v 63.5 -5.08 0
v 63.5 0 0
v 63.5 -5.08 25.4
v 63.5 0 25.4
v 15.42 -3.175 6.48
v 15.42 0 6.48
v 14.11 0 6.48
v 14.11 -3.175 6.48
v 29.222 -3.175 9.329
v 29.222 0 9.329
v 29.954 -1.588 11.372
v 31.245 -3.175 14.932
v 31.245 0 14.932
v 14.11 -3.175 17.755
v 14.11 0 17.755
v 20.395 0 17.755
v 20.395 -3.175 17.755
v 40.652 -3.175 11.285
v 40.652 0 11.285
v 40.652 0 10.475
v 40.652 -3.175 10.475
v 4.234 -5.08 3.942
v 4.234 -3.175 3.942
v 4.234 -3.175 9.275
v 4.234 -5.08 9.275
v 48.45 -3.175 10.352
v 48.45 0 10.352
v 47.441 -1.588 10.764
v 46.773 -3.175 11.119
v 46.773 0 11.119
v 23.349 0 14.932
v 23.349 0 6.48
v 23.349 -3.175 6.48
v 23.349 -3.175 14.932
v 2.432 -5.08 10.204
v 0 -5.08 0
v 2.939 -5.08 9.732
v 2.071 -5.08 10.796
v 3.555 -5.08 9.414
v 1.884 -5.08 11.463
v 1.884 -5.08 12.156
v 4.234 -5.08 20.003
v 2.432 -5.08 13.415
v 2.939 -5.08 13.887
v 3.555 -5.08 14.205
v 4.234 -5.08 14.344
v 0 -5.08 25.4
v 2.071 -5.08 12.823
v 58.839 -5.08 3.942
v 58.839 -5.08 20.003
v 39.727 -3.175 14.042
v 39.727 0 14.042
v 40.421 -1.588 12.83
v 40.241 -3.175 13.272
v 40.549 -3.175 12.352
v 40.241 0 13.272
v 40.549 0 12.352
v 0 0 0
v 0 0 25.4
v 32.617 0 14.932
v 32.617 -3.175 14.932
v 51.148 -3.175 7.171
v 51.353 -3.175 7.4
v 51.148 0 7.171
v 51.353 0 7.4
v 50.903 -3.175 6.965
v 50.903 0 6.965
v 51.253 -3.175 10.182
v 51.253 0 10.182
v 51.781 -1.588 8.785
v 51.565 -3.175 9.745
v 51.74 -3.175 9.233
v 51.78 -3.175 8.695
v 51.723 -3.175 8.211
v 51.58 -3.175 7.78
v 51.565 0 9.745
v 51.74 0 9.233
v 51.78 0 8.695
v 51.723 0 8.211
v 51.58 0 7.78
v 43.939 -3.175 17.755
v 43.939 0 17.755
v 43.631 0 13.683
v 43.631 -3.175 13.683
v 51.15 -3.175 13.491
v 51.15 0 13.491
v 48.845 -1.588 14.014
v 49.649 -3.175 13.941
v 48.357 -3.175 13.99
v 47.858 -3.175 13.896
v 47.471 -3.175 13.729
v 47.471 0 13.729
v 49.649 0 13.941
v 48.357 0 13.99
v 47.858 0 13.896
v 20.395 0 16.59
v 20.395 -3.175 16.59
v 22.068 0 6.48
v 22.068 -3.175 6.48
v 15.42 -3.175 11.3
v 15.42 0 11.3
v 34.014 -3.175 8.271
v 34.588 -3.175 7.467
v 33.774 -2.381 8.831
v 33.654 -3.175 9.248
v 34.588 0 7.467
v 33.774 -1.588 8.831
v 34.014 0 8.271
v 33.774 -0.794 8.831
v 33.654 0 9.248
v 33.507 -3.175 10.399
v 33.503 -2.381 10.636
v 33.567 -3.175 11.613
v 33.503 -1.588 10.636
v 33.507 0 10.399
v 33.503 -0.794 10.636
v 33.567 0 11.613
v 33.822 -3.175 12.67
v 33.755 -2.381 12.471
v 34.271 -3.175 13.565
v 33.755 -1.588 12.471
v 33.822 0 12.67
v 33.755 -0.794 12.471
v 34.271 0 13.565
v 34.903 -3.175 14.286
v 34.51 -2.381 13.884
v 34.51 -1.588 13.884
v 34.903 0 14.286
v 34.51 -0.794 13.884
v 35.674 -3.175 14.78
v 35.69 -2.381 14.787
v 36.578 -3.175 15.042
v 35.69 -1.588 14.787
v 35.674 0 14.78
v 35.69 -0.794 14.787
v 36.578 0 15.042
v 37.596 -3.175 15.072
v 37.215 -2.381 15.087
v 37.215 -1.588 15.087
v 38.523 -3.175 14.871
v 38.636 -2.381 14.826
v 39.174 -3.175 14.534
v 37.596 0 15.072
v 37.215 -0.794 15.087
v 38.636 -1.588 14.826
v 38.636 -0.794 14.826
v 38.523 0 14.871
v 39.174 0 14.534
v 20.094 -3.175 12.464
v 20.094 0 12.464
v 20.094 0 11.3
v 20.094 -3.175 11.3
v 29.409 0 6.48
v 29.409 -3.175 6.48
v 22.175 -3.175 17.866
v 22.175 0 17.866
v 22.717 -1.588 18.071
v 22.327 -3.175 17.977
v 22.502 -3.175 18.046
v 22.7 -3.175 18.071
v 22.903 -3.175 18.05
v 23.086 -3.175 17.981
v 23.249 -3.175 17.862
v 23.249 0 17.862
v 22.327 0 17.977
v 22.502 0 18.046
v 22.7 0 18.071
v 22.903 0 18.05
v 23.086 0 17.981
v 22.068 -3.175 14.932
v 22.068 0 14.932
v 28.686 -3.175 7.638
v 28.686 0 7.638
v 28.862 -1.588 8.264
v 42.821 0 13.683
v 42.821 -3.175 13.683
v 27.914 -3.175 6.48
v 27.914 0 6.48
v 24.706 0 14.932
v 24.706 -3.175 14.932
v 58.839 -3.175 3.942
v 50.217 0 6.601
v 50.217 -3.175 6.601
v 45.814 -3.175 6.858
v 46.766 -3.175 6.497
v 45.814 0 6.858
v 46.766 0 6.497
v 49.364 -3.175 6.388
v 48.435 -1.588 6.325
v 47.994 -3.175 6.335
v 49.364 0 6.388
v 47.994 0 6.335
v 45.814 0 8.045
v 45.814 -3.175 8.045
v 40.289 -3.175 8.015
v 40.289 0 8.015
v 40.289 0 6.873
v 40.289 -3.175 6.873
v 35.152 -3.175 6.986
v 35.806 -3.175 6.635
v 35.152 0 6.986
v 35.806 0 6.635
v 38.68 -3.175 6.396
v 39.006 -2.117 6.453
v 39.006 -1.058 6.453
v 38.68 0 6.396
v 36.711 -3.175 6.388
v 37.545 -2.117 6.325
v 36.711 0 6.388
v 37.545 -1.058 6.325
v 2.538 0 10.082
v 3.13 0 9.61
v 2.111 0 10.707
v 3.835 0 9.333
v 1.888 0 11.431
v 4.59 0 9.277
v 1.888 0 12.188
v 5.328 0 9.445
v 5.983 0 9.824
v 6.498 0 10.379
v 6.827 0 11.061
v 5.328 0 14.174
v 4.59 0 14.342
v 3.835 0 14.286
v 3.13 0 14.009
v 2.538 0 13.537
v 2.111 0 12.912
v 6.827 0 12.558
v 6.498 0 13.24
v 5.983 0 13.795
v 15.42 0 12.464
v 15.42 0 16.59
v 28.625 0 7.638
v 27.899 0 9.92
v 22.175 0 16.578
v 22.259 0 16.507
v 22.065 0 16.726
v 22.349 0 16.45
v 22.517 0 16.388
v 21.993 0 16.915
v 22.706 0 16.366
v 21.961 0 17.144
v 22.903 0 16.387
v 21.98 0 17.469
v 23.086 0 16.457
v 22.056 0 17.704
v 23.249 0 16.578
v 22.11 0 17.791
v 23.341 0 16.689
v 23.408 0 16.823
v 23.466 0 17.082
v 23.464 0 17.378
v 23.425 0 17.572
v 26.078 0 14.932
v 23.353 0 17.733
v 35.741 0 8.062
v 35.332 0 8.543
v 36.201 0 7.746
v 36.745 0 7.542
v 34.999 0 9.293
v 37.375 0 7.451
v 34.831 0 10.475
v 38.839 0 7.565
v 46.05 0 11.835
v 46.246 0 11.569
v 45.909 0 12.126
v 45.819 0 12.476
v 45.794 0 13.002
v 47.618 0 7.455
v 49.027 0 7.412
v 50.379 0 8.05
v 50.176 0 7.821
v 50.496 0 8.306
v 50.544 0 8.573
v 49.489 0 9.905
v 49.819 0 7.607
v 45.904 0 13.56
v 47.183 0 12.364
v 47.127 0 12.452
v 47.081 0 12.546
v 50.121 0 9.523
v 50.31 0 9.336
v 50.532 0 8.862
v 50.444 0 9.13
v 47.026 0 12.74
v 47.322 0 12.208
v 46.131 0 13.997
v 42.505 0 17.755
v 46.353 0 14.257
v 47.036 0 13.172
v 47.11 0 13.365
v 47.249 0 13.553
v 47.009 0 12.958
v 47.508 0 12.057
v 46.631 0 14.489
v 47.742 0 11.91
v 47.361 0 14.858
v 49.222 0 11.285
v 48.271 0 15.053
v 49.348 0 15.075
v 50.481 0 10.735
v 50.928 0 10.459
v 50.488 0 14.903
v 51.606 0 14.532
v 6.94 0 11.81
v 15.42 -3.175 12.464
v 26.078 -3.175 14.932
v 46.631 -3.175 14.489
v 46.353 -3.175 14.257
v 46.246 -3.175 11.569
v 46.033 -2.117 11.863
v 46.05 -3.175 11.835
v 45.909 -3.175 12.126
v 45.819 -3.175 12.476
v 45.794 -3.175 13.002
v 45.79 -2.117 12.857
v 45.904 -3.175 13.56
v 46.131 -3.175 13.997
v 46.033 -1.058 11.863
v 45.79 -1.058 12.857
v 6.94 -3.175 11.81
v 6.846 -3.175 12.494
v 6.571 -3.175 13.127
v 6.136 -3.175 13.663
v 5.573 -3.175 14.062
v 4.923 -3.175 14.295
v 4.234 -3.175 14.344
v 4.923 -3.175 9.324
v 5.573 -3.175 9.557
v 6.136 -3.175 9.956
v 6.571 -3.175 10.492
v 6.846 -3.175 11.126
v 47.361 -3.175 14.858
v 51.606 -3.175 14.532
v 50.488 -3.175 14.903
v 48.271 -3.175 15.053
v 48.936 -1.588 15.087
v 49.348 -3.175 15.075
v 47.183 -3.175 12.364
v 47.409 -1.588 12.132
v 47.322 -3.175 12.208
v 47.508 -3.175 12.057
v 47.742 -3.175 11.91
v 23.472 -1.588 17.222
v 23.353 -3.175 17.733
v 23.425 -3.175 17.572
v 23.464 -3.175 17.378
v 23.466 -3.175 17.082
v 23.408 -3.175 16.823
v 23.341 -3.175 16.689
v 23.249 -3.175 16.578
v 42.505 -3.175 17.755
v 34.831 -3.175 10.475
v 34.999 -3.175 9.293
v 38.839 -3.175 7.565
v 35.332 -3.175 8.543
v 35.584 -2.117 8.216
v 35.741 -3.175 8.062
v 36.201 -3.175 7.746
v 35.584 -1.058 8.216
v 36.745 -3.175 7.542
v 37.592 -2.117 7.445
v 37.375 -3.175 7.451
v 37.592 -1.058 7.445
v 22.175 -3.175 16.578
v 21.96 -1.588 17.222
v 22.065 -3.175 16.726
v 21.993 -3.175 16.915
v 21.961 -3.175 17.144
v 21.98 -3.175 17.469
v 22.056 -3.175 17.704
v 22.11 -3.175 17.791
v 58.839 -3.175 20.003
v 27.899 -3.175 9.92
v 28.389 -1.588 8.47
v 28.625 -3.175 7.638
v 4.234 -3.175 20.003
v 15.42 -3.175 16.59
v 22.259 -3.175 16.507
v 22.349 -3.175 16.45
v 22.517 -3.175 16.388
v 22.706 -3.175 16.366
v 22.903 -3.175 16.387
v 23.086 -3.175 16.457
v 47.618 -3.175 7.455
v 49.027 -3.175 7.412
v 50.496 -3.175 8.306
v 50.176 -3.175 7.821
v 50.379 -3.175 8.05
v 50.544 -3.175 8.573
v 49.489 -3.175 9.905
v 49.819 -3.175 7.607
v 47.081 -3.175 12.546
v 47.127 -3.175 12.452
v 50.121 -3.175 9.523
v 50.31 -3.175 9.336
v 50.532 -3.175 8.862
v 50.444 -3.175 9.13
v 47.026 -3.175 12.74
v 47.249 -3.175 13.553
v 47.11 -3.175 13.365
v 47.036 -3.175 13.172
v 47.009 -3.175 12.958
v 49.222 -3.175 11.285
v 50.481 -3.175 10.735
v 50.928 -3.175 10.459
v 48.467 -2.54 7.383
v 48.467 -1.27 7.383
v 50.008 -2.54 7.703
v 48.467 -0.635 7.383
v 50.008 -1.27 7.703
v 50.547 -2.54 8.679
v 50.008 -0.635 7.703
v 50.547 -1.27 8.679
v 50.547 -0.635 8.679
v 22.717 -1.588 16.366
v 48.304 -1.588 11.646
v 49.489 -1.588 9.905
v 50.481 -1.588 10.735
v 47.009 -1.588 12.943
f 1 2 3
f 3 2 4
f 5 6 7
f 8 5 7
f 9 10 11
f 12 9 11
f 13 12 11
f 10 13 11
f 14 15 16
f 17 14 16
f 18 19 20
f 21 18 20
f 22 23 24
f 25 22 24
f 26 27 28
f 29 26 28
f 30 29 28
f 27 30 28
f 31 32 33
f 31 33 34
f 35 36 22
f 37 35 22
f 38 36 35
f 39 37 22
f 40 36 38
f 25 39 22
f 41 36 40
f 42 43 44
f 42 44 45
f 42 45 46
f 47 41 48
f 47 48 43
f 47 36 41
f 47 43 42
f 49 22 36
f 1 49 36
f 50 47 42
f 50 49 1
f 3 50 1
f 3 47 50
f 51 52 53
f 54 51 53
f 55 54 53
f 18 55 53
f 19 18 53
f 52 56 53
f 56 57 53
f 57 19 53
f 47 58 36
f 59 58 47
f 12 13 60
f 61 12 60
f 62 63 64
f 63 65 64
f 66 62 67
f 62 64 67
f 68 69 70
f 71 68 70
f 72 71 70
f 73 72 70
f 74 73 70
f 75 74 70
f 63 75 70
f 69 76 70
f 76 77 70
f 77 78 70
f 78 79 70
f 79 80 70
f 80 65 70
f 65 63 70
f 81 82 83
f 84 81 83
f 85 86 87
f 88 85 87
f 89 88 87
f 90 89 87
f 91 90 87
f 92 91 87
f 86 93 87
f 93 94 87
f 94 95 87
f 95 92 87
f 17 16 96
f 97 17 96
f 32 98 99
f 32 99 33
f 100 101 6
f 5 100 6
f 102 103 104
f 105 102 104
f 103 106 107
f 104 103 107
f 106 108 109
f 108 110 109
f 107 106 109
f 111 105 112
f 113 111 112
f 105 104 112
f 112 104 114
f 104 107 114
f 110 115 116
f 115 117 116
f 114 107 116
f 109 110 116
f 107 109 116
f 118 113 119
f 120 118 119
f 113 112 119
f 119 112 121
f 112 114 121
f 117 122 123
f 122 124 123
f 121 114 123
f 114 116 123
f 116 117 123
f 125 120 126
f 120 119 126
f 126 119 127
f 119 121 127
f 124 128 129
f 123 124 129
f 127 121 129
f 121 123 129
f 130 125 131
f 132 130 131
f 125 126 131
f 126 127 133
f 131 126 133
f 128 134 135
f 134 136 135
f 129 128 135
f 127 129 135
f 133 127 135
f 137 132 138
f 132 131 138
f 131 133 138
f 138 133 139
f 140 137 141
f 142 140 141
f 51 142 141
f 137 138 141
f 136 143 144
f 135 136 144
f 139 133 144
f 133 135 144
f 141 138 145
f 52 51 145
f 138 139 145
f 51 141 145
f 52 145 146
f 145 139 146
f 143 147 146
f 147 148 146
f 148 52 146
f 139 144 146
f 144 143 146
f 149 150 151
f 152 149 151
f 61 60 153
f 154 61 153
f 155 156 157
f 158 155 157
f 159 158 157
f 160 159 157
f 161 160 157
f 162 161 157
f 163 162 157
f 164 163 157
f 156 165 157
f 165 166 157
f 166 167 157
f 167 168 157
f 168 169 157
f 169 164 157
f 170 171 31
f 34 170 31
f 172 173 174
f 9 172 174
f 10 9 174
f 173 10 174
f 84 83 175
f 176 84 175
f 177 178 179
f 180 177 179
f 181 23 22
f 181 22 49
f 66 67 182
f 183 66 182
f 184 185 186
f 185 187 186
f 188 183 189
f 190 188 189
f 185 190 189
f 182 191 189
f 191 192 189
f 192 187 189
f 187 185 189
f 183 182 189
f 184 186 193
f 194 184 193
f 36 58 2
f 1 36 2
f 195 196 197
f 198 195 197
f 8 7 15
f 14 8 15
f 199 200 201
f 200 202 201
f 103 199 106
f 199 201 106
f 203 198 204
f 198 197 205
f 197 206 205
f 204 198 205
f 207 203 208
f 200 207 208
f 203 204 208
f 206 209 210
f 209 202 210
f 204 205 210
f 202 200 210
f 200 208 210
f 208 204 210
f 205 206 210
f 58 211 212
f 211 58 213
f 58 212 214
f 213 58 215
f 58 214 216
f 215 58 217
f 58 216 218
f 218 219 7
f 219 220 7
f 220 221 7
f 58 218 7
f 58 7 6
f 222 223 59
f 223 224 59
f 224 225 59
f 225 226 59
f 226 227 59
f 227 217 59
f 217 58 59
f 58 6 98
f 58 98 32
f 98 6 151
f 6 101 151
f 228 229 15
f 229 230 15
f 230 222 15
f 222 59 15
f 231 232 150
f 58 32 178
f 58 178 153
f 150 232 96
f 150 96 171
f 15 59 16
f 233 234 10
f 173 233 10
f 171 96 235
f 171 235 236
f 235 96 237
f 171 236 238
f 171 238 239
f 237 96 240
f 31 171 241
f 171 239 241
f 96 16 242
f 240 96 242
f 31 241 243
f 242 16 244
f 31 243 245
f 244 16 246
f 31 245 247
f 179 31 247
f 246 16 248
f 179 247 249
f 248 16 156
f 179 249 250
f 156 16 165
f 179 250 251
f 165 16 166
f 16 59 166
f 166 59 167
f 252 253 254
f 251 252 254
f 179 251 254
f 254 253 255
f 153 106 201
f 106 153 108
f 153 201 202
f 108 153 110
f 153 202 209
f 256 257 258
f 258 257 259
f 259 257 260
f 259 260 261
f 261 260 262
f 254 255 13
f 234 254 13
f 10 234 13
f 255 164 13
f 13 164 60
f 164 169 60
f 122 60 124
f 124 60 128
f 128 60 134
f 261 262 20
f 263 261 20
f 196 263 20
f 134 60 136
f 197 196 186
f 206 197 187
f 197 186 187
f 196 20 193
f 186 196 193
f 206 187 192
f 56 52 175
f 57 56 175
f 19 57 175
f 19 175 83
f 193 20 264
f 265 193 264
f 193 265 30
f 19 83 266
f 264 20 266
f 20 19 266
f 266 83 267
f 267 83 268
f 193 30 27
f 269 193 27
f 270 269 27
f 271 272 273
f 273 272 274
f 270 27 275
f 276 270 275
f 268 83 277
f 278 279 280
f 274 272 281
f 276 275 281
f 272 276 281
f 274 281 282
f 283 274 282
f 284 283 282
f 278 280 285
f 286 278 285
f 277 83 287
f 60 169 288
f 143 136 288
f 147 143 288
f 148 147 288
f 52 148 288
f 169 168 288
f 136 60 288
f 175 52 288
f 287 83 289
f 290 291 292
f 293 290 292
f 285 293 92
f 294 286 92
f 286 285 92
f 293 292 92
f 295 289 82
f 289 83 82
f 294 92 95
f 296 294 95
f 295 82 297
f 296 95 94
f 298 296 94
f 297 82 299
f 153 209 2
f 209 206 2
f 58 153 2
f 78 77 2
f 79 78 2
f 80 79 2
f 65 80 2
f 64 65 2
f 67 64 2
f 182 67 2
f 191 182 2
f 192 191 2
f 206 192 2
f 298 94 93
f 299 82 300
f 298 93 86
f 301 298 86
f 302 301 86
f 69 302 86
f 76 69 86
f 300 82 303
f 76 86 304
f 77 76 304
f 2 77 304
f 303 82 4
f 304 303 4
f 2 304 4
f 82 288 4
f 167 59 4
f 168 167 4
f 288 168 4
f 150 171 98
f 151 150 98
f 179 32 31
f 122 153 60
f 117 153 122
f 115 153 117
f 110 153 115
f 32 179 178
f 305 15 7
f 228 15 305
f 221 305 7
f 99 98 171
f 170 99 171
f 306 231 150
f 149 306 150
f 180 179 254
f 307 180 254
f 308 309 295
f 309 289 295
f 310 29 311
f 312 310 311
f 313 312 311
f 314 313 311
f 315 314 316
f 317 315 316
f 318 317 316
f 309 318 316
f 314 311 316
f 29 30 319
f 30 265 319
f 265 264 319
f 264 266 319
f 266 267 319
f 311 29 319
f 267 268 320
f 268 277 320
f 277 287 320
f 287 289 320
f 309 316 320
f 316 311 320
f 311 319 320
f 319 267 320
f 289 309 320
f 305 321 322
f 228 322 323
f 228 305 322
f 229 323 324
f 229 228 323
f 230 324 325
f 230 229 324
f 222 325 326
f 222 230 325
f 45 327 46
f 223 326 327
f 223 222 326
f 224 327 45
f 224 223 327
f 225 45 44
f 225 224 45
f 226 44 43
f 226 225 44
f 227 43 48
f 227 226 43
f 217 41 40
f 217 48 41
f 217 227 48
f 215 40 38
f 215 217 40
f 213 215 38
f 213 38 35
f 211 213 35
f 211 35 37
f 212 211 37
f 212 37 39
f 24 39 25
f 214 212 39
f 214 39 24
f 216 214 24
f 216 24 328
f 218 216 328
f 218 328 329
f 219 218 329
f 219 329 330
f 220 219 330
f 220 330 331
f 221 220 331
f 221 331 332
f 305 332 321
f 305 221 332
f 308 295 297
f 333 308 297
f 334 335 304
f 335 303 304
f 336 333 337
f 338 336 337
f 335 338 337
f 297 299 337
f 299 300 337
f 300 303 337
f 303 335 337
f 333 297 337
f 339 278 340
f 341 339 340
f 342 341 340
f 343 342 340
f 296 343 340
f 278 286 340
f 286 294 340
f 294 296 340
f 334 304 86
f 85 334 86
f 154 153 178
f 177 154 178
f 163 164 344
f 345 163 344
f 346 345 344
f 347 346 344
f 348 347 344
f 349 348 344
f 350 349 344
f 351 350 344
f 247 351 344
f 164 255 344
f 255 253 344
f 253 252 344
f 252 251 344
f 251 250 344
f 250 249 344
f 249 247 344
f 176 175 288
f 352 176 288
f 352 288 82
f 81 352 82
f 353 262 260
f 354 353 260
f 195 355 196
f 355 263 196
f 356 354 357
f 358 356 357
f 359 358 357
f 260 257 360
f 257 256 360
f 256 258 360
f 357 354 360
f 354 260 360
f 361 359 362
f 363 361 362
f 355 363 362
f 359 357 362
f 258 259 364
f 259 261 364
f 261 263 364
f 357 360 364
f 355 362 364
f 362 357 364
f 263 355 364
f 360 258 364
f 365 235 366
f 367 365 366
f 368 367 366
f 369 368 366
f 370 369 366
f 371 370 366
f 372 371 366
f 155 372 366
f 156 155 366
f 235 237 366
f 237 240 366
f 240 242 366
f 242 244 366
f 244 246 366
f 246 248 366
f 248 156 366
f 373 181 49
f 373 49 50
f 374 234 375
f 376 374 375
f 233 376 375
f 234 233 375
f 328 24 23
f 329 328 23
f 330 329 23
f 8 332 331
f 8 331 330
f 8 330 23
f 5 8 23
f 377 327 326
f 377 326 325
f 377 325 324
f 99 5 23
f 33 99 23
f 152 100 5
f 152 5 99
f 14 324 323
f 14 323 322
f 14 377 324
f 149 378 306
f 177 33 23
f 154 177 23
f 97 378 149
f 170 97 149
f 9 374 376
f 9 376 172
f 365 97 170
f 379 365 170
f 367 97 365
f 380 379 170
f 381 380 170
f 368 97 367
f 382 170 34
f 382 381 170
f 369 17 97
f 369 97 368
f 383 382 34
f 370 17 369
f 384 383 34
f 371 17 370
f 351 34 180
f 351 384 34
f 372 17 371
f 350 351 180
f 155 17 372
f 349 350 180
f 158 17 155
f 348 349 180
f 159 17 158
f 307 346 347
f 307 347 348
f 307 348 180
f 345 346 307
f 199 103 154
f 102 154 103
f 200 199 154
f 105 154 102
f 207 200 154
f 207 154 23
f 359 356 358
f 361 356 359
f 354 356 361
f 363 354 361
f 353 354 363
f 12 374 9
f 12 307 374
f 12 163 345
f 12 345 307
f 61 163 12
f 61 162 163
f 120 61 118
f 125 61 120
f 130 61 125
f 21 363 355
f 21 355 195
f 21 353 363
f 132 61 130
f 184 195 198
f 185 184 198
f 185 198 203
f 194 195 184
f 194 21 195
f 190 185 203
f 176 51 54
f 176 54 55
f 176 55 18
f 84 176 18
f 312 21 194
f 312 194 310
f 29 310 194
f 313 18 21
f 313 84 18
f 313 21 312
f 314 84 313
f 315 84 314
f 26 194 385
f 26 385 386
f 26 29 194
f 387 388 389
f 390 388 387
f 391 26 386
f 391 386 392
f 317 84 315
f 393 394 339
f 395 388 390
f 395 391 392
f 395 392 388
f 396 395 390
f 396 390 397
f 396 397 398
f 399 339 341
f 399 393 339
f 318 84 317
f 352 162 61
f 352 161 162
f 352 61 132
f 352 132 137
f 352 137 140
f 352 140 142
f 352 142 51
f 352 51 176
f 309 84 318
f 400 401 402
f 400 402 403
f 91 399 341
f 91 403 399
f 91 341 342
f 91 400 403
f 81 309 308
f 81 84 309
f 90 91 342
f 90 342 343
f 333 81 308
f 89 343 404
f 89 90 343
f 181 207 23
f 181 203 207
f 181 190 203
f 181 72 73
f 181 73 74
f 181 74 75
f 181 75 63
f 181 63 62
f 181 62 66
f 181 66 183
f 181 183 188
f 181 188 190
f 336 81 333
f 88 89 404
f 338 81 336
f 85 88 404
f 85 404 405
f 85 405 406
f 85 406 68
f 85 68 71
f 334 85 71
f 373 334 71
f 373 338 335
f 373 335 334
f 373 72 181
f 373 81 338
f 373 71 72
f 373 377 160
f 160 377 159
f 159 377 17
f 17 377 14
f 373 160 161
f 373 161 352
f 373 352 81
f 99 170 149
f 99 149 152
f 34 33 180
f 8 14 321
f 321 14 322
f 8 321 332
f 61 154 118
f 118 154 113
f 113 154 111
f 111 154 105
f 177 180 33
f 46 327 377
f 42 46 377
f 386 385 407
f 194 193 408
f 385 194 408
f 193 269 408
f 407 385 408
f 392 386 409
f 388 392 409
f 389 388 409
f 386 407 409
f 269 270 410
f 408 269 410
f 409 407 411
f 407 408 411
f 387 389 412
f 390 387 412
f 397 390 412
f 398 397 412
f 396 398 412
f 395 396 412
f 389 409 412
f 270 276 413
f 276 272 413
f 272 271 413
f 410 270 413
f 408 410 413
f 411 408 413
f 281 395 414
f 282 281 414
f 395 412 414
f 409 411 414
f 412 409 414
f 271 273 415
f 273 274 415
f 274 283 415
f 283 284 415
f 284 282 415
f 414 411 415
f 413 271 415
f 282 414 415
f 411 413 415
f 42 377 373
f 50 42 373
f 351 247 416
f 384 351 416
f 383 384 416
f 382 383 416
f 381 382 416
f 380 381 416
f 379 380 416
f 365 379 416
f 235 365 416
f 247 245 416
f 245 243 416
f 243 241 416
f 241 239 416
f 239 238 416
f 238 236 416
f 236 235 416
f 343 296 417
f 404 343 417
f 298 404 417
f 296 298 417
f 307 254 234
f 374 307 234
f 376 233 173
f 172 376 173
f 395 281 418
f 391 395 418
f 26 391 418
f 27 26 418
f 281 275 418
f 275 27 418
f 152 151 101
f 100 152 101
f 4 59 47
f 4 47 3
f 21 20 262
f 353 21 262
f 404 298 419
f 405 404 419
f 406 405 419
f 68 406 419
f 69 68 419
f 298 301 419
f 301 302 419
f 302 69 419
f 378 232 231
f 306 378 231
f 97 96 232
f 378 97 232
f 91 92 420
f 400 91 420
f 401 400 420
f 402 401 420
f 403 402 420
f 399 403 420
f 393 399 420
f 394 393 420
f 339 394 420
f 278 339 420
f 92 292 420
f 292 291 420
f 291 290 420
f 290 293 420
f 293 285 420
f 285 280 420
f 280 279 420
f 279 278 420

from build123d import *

# Parameters (mm, degrees)
F0_W     = 63.5
F0_H     = 25.4
F0_W_2   = 54.6053671278
F0_H_2   = 16.0604021512
F1_DEPTH = 5.08
F0_W_3   = 1.2807164436
F0_H_3   = 8.4517414633
F2_DEPTH = 3.175
F3_R     = 2.54
F4_DEPTH = 25.4
F5_DEPTH = 3.175


with BuildPart() as f1:
    # F0 (on Front) → F1 (new body)
    with BuildSketch(Plane.XZ):
        with Locations((31.75, 12.7)):
            Rectangle(F0_W, F0_H)
        with Locations((31.5367903095, 11.9723000098)):
            Rectangle(F0_W_2, F0_H_2, mode=Mode.SUBTRACT)
    extrude(amount=F1_DEPTH)

    # F0 (on Front) → F2 (join)
    with BuildSketch(Plane.XZ):
        with Locations((31.5367903095, 11.9723000098)):
            Rectangle(F0_W_2, F0_H_2)
        with Locations((22.7084914528, 10.7061468506)):
            Rectangle(F0_W_3, F0_H_3, mode=Mode.SUBTRACT)
        Polygon((15.4202525004, 11.2996194994), (15.4202525004, 6.480276119), (14.1099241159, 6.480276119), (14.1099241159, 17.7550226141), (20.3950585705, 17.7550226141), (20.3950585705, 16.5902862723), (15.4202525004, 16.5902862723), (15.4202525004, 12.4643558412), (20.0940038381, 12.4643558412), (20.0940038381, 11.2996194994), align=None, mode=Mode.SUBTRACT)
        with BuildLine():
            Line((29.4094269108, 6.480276119), (27.9140238957, 6.480276119))
            Line((27.9140238957, 6.480276119), (24.7060636322, 14.9320175823))
            Line((24.7060636322, 14.9320175823), (26.0780835603, 14.9320175823))
            Line((26.0780835603, 14.9320175823), (27.8992179252, 9.9201965861))
            add(Edge.make_bspline(
                [(27.8992179252, 9.9201965861), (28.5161333605, 8.1607537647), (28.6247104771, 7.6376094755)],
                knots=[0, 0, 0, 1, 1, 1], degree=2))
            Line((28.6247104771, 7.6376094755), (28.6864020207, 7.6376094755))
            add(Edge.make_bspline(
                [(28.6864020207, 7.6376094755), (28.7703025199, 8.0447736628), (29.2218846185, 9.3291915991)],
                knots=[0, 0, 0, 1, 1, 1], degree=2))
            add(Edge.make_bspline(
                [(29.2218846185, 9.3291915991), (29.6734667171, 10.6136095353), (31.2453672462, 14.9320175823)],
                knots=[0, 0, 0, 1, 1, 1], degree=2))
            Line((31.2453672462, 14.9320175823), (32.6173871743, 14.9320175823))
            Line((32.6173871743, 14.9320175823), (29.4094269108, 6.480276119))
        make_face(mode=Mode.SUBTRACT)
        with BuildLine():
            add(Edge.make_bspline(
                [(39.006163422, 6.4531318398), (38.4015862954, 6.3248134293), (37.5453076713, 6.3248134293)],
                knots=[0, 0, 0, 1, 1, 1], degree=2))
            add(Edge.make_bspline(
                [(37.5453076713, 6.3248134293), (35.6723524098, 6.3248134293), (34.5878150745, 7.4673408154)],
                knots=[0, 0, 0, 1, 1, 1], degree=2))
            add(Edge.make_bspline(
                [(34.5878150745, 7.4673408154), (33.5032777393, 8.6098682015), (33.5032777393, 10.635818491)],
                knots=[0, 0, 0, 1, 1, 1], degree=2))
            add(Edge.make_bspline(
                [(33.5032777393, 10.635818491), (33.5032777393, 12.6815100744), (34.5100837297, 13.8844951732)],
                knots=[0, 0, 0, 1, 1, 1], degree=2))
            add(Edge.make_bspline(
                [(34.5100837297, 13.8844951732), (35.5168897201, 15.087480272), (37.214640998, 15.087480272)],
                knots=[0, 0, 0, 1, 1, 1], degree=2))
            add(Edge.make_bspline(
                [(37.214640998, 15.087480272), (38.8013474975, 15.087480272), (39.7267206504, 14.0424255246)],
                knots=[0, 0, 0, 1, 1, 1], degree=2))
            add(Edge.make_bspline(
                [(39.7267206504, 14.0424255246), (40.6520938033, 12.9973707773), (40.6520938033, 11.2848135289)],
                knots=[0, 0, 0, 1, 1, 1], degree=2))
            Line((40.6520938033, 11.2848135289), (40.6520938033, 10.4754204778))
            Line((40.6520938033, 10.4754204778), (34.830879756, 10.4754204778))
            add(Edge.make_bspline(
                [(34.830879756, 10.4754204778), (34.8703623439, 8.9874204479), (35.5835165871, 8.2162761538)],
                knots=[0, 0, 0, 1, 1, 1], degree=2))
            add(Edge.make_bspline(
                [(35.5835165871, 8.2162761538), (36.2966708303, 7.4451318597), (37.5921932444, 7.4451318597)],
                knots=[0, 0, 0, 1, 1, 1], degree=2))
            add(Edge.make_bspline(
                [(37.5921932444, 7.4451318597), (38.9568101872, 7.4451318597), (40.2893475274, 8.0151617219)],
                knots=[0, 0, 0, 1, 1, 1], degree=2))
            Line((40.2893475274, 8.0151617219), (40.2893475274, 6.8726343358))
            add(Edge.make_bspline(
                [(40.2893475274, 6.8726343358), (39.6107405486, 6.5814502503), (39.006163422, 6.4531318398)],
                knots=[0, 0, 0, 1, 1, 1], degree=2))
        make_face(mode=Mode.SUBTRACT)
        with BuildLine():
            add(Edge.make_bspline(
                [(51.2531686432, 10.1817687306), (51.7812482558, 9.6265448389), (51.7812482558, 8.7850721852)],
                knots=[0, 0, 0, 1, 1, 1], degree=2))
            add(Edge.make_bspline(
                [(51.7812482558, 8.7850721852), (51.7812482558, 7.6055298729), (50.902760676, 6.9651716511)],
                knots=[0, 0, 0, 1, 1, 1], degree=2))
            add(Edge.make_bspline(
                [(50.902760676, 6.9651716511), (50.0242730961, 6.3248134293), (48.4350989348, 6.3248134293)],
                knots=[0, 0, 0, 1, 1, 1], degree=2))
            add(Edge.make_bspline(
                [(48.4350989348, 6.3248134293), (46.7546212891, 6.3248134293), (45.8144421658, 6.8578283654)],
                knots=[0, 0, 0, 1, 1, 1], degree=2))
            Line((45.8144421658, 6.8578283654), (45.8144421658, 8.0447736628))
            add(Edge.make_bspline(
                [(45.8144421658, 8.0447736628), (46.4239546158, 7.7363159452), (47.1210690577, 7.5598781307)],
                knots=[0, 0, 0, 1, 1, 1], degree=2))
            add(Edge.make_bspline(
                [(47.1210690577, 7.5598781307), (47.8181834996, 7.3834403162), (48.4671785375, 7.3834403162)],
                knots=[0, 0, 0, 1, 1, 1], degree=2))
            add(Edge.make_bspline(
                [(48.4671785375, 7.3834403162), (49.4690492044, 7.3834403162), (50.0082332948, 7.7030025117)],
                knots=[0, 0, 0, 1, 1, 1], degree=2))
            add(Edge.make_bspline(
                [(50.0082332948, 7.7030025117), (50.5474173852, 8.0225647072), (50.5474173852, 8.6789627303)],
                knots=[0, 0, 0, 1, 1, 1], degree=2))
            add(Edge.make_bspline(
                [(50.5474173852, 8.6789627303), (50.5474173852, 9.1724950785), (50.120511904, 9.5229030458)],
                knots=[0, 0, 0, 1, 1, 1], degree=2))
            add(Edge.make_bspline(
                [(50.120511904, 9.5229030458), (49.6936064228, 9.873311013), (48.4499049053, 10.3520373908)],
                knots=[0, 0, 0, 1, 1, 1], degree=2))
            add(Edge.make_bspline(
                [(48.4499049053, 10.3520373908), (47.270362593, 10.7912811807), (46.7731287522, 11.1194801923)],
                knots=[0, 0, 0, 1, 1, 1], degree=2))
            add(Edge.make_bspline(
                [(46.7731287522, 11.1194801923), (46.2758949114, 11.4476792038), (46.0328302299, 11.8634802072)],
                knots=[0, 0, 0, 1, 1, 1], degree=2))
            add(Edge.make_bspline(
                [(46.0328302299, 11.8634802072), (45.7897655484, 12.2792812106), (45.7897655484, 12.856714058)],
                knots=[0, 0, 0, 1, 1, 1], degree=2))
            add(Edge.make_bspline(
                [(45.7897655484, 12.856714058), (45.7897655484, 13.8906643275), (46.6312382021, 14.4890722998)],
                knots=[0, 0, 0, 1, 1, 1], degree=2))
            add(Edge.make_bspline(
                [(46.6312382021, 14.4890722998), (47.4727108558, 15.087480272), (48.9360342683, 15.087480272)],
                knots=[0, 0, 0, 1, 1, 1], degree=2))
            add(Edge.make_bspline(
                [(48.9360342683, 15.087480272), (50.3006512111, 15.087480272), (51.6060442722, 14.5322563802)],
                knots=[0, 0, 0, 1, 1, 1], degree=2))
            Line((51.6060442722, 14.5322563802), (51.1495268501, 13.4909031255))
            add(Edge.make_bspline(
                [(51.1495268501, 13.4909031255), (49.8786810534, 14.0140474146), (48.8447307839, 14.0140474146)],
                knots=[0, 0, 0, 1, 1, 1], degree=2))
            add(Edge.make_bspline(
                [(48.8447307839, 14.0140474146), (47.9341636014, 14.0140474146), (47.4714770249, 13.7290324835)],
                knots=[0, 0, 0, 1, 1, 1], degree=2))
            add(Edge.make_bspline(
                [(47.4714770249, 13.7290324835), (47.0087904485, 13.4440175524), (47.0087904485, 12.943082219)],
                knots=[0, 0, 0, 1, 1, 1], degree=2))
            add(Edge.make_bspline(
                [(47.0087904485, 12.943082219), (47.0087904485, 12.6025448987), (47.1827606012, 12.3644155407)],
                knots=[0, 0, 0, 1, 1, 1], degree=2))
            add(Edge.make_bspline(
                [(47.1827606012, 12.3644155407), (47.356730754, 12.1262861826), (47.7416859856, 11.9103657803)],
                knots=[0, 0, 0, 1, 1, 1], degree=2))
            add(Edge.make_bspline(
                [(47.7416859856, 11.9103657803), (48.1266412172, 11.6944453779), (49.2222830303, 11.2848135289)],
                knots=[0, 0, 0, 1, 1, 1], degree=2))
            add(Edge.make_bspline(
                [(49.2222830303, 11.2848135289), (50.7250890306, 10.7369926224), (51.2531686432, 10.1817687306)],
                knots=[0, 0, 0, 1, 1, 1], degree=2))
        make_face(mode=Mode.SUBTRACT)
        with BuildLine():
            add(Edge.make_bspline(
                [(22.1754765167, 16.5779479636), (21.9595561144, 16.7901668734), (21.9595561144, 17.2220076781)],
                knots=[0, 0, 0, 1, 1, 1], degree=2))
            add(Edge.make_bspline(
                [(21.9595561144, 17.2220076781), (21.9595561144, 17.661251468), (22.1754765167, 17.8660673925)],
                knots=[0, 0, 0, 1, 1, 1], degree=2))
            add(Edge.make_bspline(
                [(22.1754765167, 17.8660673925), (22.3913969191, 18.070883317), (22.7171282689, 18.070883317)],
                knots=[0, 0, 0, 1, 1, 1], degree=2))
            add(Edge.make_bspline(
                [(22.7171282689, 18.070883317), (23.0255859865, 18.070883317), (23.2489093741, 17.8623658999)],
                knots=[0, 0, 0, 1, 1, 1], degree=2))
            add(Edge.make_bspline(
                [(23.2489093741, 17.8623658999), (23.4722327617, 17.6538484827), (23.4722327617, 17.2220076781)],
                knots=[0, 0, 0, 1, 1, 1], degree=2))
            add(Edge.make_bspline(
                [(23.4722327617, 17.2220076781), (23.4722327617, 16.7901668734), (23.2489093741, 16.5779479636)],
                knots=[0, 0, 0, 1, 1, 1], degree=2))
            add(Edge.make_bspline(
                [(23.2489093741, 16.5779479636), (23.0255859865, 16.3657290539), (22.7171282689, 16.3657290539)],
                knots=[0, 0, 0, 1, 1, 1], degree=2))
            add(Edge.make_bspline(
                [(22.7171282689, 16.3657290539), (22.3913969191, 16.3657290539), (22.1754765167, 16.5779479636)],
                knots=[0, 0, 0, 1, 1, 1], degree=2))
        make_face(mode=Mode.SUBTRACT)
        Polygon((42.5053077709, 17.7550226141), (43.9390192425, 17.7550226141), (43.6305615249, 13.6833807413), (42.8211684738, 13.6833807413), align=None, mode=Mode.SUBTRACT)
    extrude(amount=F2_DEPTH)

    # F3 (on Front) → F4 (cut)
    with BuildSketch(Plane.XZ):
        with Locations((4.3997538427, 11.8095606944)):
            Circle(F3_R)
    extrude(amount=F4_DEPTH, mode=Mode.SUBTRACT)

    # F5 (add): a face of the model
    f5_faces = [f1.faces().sort_by_distance(p)[0] for p in [
        (31.8480546153, -3.175, 12.0163754406),
    ]]
    extrude(f5_faces, amount=-F5_DEPTH)


solid = f1.part
